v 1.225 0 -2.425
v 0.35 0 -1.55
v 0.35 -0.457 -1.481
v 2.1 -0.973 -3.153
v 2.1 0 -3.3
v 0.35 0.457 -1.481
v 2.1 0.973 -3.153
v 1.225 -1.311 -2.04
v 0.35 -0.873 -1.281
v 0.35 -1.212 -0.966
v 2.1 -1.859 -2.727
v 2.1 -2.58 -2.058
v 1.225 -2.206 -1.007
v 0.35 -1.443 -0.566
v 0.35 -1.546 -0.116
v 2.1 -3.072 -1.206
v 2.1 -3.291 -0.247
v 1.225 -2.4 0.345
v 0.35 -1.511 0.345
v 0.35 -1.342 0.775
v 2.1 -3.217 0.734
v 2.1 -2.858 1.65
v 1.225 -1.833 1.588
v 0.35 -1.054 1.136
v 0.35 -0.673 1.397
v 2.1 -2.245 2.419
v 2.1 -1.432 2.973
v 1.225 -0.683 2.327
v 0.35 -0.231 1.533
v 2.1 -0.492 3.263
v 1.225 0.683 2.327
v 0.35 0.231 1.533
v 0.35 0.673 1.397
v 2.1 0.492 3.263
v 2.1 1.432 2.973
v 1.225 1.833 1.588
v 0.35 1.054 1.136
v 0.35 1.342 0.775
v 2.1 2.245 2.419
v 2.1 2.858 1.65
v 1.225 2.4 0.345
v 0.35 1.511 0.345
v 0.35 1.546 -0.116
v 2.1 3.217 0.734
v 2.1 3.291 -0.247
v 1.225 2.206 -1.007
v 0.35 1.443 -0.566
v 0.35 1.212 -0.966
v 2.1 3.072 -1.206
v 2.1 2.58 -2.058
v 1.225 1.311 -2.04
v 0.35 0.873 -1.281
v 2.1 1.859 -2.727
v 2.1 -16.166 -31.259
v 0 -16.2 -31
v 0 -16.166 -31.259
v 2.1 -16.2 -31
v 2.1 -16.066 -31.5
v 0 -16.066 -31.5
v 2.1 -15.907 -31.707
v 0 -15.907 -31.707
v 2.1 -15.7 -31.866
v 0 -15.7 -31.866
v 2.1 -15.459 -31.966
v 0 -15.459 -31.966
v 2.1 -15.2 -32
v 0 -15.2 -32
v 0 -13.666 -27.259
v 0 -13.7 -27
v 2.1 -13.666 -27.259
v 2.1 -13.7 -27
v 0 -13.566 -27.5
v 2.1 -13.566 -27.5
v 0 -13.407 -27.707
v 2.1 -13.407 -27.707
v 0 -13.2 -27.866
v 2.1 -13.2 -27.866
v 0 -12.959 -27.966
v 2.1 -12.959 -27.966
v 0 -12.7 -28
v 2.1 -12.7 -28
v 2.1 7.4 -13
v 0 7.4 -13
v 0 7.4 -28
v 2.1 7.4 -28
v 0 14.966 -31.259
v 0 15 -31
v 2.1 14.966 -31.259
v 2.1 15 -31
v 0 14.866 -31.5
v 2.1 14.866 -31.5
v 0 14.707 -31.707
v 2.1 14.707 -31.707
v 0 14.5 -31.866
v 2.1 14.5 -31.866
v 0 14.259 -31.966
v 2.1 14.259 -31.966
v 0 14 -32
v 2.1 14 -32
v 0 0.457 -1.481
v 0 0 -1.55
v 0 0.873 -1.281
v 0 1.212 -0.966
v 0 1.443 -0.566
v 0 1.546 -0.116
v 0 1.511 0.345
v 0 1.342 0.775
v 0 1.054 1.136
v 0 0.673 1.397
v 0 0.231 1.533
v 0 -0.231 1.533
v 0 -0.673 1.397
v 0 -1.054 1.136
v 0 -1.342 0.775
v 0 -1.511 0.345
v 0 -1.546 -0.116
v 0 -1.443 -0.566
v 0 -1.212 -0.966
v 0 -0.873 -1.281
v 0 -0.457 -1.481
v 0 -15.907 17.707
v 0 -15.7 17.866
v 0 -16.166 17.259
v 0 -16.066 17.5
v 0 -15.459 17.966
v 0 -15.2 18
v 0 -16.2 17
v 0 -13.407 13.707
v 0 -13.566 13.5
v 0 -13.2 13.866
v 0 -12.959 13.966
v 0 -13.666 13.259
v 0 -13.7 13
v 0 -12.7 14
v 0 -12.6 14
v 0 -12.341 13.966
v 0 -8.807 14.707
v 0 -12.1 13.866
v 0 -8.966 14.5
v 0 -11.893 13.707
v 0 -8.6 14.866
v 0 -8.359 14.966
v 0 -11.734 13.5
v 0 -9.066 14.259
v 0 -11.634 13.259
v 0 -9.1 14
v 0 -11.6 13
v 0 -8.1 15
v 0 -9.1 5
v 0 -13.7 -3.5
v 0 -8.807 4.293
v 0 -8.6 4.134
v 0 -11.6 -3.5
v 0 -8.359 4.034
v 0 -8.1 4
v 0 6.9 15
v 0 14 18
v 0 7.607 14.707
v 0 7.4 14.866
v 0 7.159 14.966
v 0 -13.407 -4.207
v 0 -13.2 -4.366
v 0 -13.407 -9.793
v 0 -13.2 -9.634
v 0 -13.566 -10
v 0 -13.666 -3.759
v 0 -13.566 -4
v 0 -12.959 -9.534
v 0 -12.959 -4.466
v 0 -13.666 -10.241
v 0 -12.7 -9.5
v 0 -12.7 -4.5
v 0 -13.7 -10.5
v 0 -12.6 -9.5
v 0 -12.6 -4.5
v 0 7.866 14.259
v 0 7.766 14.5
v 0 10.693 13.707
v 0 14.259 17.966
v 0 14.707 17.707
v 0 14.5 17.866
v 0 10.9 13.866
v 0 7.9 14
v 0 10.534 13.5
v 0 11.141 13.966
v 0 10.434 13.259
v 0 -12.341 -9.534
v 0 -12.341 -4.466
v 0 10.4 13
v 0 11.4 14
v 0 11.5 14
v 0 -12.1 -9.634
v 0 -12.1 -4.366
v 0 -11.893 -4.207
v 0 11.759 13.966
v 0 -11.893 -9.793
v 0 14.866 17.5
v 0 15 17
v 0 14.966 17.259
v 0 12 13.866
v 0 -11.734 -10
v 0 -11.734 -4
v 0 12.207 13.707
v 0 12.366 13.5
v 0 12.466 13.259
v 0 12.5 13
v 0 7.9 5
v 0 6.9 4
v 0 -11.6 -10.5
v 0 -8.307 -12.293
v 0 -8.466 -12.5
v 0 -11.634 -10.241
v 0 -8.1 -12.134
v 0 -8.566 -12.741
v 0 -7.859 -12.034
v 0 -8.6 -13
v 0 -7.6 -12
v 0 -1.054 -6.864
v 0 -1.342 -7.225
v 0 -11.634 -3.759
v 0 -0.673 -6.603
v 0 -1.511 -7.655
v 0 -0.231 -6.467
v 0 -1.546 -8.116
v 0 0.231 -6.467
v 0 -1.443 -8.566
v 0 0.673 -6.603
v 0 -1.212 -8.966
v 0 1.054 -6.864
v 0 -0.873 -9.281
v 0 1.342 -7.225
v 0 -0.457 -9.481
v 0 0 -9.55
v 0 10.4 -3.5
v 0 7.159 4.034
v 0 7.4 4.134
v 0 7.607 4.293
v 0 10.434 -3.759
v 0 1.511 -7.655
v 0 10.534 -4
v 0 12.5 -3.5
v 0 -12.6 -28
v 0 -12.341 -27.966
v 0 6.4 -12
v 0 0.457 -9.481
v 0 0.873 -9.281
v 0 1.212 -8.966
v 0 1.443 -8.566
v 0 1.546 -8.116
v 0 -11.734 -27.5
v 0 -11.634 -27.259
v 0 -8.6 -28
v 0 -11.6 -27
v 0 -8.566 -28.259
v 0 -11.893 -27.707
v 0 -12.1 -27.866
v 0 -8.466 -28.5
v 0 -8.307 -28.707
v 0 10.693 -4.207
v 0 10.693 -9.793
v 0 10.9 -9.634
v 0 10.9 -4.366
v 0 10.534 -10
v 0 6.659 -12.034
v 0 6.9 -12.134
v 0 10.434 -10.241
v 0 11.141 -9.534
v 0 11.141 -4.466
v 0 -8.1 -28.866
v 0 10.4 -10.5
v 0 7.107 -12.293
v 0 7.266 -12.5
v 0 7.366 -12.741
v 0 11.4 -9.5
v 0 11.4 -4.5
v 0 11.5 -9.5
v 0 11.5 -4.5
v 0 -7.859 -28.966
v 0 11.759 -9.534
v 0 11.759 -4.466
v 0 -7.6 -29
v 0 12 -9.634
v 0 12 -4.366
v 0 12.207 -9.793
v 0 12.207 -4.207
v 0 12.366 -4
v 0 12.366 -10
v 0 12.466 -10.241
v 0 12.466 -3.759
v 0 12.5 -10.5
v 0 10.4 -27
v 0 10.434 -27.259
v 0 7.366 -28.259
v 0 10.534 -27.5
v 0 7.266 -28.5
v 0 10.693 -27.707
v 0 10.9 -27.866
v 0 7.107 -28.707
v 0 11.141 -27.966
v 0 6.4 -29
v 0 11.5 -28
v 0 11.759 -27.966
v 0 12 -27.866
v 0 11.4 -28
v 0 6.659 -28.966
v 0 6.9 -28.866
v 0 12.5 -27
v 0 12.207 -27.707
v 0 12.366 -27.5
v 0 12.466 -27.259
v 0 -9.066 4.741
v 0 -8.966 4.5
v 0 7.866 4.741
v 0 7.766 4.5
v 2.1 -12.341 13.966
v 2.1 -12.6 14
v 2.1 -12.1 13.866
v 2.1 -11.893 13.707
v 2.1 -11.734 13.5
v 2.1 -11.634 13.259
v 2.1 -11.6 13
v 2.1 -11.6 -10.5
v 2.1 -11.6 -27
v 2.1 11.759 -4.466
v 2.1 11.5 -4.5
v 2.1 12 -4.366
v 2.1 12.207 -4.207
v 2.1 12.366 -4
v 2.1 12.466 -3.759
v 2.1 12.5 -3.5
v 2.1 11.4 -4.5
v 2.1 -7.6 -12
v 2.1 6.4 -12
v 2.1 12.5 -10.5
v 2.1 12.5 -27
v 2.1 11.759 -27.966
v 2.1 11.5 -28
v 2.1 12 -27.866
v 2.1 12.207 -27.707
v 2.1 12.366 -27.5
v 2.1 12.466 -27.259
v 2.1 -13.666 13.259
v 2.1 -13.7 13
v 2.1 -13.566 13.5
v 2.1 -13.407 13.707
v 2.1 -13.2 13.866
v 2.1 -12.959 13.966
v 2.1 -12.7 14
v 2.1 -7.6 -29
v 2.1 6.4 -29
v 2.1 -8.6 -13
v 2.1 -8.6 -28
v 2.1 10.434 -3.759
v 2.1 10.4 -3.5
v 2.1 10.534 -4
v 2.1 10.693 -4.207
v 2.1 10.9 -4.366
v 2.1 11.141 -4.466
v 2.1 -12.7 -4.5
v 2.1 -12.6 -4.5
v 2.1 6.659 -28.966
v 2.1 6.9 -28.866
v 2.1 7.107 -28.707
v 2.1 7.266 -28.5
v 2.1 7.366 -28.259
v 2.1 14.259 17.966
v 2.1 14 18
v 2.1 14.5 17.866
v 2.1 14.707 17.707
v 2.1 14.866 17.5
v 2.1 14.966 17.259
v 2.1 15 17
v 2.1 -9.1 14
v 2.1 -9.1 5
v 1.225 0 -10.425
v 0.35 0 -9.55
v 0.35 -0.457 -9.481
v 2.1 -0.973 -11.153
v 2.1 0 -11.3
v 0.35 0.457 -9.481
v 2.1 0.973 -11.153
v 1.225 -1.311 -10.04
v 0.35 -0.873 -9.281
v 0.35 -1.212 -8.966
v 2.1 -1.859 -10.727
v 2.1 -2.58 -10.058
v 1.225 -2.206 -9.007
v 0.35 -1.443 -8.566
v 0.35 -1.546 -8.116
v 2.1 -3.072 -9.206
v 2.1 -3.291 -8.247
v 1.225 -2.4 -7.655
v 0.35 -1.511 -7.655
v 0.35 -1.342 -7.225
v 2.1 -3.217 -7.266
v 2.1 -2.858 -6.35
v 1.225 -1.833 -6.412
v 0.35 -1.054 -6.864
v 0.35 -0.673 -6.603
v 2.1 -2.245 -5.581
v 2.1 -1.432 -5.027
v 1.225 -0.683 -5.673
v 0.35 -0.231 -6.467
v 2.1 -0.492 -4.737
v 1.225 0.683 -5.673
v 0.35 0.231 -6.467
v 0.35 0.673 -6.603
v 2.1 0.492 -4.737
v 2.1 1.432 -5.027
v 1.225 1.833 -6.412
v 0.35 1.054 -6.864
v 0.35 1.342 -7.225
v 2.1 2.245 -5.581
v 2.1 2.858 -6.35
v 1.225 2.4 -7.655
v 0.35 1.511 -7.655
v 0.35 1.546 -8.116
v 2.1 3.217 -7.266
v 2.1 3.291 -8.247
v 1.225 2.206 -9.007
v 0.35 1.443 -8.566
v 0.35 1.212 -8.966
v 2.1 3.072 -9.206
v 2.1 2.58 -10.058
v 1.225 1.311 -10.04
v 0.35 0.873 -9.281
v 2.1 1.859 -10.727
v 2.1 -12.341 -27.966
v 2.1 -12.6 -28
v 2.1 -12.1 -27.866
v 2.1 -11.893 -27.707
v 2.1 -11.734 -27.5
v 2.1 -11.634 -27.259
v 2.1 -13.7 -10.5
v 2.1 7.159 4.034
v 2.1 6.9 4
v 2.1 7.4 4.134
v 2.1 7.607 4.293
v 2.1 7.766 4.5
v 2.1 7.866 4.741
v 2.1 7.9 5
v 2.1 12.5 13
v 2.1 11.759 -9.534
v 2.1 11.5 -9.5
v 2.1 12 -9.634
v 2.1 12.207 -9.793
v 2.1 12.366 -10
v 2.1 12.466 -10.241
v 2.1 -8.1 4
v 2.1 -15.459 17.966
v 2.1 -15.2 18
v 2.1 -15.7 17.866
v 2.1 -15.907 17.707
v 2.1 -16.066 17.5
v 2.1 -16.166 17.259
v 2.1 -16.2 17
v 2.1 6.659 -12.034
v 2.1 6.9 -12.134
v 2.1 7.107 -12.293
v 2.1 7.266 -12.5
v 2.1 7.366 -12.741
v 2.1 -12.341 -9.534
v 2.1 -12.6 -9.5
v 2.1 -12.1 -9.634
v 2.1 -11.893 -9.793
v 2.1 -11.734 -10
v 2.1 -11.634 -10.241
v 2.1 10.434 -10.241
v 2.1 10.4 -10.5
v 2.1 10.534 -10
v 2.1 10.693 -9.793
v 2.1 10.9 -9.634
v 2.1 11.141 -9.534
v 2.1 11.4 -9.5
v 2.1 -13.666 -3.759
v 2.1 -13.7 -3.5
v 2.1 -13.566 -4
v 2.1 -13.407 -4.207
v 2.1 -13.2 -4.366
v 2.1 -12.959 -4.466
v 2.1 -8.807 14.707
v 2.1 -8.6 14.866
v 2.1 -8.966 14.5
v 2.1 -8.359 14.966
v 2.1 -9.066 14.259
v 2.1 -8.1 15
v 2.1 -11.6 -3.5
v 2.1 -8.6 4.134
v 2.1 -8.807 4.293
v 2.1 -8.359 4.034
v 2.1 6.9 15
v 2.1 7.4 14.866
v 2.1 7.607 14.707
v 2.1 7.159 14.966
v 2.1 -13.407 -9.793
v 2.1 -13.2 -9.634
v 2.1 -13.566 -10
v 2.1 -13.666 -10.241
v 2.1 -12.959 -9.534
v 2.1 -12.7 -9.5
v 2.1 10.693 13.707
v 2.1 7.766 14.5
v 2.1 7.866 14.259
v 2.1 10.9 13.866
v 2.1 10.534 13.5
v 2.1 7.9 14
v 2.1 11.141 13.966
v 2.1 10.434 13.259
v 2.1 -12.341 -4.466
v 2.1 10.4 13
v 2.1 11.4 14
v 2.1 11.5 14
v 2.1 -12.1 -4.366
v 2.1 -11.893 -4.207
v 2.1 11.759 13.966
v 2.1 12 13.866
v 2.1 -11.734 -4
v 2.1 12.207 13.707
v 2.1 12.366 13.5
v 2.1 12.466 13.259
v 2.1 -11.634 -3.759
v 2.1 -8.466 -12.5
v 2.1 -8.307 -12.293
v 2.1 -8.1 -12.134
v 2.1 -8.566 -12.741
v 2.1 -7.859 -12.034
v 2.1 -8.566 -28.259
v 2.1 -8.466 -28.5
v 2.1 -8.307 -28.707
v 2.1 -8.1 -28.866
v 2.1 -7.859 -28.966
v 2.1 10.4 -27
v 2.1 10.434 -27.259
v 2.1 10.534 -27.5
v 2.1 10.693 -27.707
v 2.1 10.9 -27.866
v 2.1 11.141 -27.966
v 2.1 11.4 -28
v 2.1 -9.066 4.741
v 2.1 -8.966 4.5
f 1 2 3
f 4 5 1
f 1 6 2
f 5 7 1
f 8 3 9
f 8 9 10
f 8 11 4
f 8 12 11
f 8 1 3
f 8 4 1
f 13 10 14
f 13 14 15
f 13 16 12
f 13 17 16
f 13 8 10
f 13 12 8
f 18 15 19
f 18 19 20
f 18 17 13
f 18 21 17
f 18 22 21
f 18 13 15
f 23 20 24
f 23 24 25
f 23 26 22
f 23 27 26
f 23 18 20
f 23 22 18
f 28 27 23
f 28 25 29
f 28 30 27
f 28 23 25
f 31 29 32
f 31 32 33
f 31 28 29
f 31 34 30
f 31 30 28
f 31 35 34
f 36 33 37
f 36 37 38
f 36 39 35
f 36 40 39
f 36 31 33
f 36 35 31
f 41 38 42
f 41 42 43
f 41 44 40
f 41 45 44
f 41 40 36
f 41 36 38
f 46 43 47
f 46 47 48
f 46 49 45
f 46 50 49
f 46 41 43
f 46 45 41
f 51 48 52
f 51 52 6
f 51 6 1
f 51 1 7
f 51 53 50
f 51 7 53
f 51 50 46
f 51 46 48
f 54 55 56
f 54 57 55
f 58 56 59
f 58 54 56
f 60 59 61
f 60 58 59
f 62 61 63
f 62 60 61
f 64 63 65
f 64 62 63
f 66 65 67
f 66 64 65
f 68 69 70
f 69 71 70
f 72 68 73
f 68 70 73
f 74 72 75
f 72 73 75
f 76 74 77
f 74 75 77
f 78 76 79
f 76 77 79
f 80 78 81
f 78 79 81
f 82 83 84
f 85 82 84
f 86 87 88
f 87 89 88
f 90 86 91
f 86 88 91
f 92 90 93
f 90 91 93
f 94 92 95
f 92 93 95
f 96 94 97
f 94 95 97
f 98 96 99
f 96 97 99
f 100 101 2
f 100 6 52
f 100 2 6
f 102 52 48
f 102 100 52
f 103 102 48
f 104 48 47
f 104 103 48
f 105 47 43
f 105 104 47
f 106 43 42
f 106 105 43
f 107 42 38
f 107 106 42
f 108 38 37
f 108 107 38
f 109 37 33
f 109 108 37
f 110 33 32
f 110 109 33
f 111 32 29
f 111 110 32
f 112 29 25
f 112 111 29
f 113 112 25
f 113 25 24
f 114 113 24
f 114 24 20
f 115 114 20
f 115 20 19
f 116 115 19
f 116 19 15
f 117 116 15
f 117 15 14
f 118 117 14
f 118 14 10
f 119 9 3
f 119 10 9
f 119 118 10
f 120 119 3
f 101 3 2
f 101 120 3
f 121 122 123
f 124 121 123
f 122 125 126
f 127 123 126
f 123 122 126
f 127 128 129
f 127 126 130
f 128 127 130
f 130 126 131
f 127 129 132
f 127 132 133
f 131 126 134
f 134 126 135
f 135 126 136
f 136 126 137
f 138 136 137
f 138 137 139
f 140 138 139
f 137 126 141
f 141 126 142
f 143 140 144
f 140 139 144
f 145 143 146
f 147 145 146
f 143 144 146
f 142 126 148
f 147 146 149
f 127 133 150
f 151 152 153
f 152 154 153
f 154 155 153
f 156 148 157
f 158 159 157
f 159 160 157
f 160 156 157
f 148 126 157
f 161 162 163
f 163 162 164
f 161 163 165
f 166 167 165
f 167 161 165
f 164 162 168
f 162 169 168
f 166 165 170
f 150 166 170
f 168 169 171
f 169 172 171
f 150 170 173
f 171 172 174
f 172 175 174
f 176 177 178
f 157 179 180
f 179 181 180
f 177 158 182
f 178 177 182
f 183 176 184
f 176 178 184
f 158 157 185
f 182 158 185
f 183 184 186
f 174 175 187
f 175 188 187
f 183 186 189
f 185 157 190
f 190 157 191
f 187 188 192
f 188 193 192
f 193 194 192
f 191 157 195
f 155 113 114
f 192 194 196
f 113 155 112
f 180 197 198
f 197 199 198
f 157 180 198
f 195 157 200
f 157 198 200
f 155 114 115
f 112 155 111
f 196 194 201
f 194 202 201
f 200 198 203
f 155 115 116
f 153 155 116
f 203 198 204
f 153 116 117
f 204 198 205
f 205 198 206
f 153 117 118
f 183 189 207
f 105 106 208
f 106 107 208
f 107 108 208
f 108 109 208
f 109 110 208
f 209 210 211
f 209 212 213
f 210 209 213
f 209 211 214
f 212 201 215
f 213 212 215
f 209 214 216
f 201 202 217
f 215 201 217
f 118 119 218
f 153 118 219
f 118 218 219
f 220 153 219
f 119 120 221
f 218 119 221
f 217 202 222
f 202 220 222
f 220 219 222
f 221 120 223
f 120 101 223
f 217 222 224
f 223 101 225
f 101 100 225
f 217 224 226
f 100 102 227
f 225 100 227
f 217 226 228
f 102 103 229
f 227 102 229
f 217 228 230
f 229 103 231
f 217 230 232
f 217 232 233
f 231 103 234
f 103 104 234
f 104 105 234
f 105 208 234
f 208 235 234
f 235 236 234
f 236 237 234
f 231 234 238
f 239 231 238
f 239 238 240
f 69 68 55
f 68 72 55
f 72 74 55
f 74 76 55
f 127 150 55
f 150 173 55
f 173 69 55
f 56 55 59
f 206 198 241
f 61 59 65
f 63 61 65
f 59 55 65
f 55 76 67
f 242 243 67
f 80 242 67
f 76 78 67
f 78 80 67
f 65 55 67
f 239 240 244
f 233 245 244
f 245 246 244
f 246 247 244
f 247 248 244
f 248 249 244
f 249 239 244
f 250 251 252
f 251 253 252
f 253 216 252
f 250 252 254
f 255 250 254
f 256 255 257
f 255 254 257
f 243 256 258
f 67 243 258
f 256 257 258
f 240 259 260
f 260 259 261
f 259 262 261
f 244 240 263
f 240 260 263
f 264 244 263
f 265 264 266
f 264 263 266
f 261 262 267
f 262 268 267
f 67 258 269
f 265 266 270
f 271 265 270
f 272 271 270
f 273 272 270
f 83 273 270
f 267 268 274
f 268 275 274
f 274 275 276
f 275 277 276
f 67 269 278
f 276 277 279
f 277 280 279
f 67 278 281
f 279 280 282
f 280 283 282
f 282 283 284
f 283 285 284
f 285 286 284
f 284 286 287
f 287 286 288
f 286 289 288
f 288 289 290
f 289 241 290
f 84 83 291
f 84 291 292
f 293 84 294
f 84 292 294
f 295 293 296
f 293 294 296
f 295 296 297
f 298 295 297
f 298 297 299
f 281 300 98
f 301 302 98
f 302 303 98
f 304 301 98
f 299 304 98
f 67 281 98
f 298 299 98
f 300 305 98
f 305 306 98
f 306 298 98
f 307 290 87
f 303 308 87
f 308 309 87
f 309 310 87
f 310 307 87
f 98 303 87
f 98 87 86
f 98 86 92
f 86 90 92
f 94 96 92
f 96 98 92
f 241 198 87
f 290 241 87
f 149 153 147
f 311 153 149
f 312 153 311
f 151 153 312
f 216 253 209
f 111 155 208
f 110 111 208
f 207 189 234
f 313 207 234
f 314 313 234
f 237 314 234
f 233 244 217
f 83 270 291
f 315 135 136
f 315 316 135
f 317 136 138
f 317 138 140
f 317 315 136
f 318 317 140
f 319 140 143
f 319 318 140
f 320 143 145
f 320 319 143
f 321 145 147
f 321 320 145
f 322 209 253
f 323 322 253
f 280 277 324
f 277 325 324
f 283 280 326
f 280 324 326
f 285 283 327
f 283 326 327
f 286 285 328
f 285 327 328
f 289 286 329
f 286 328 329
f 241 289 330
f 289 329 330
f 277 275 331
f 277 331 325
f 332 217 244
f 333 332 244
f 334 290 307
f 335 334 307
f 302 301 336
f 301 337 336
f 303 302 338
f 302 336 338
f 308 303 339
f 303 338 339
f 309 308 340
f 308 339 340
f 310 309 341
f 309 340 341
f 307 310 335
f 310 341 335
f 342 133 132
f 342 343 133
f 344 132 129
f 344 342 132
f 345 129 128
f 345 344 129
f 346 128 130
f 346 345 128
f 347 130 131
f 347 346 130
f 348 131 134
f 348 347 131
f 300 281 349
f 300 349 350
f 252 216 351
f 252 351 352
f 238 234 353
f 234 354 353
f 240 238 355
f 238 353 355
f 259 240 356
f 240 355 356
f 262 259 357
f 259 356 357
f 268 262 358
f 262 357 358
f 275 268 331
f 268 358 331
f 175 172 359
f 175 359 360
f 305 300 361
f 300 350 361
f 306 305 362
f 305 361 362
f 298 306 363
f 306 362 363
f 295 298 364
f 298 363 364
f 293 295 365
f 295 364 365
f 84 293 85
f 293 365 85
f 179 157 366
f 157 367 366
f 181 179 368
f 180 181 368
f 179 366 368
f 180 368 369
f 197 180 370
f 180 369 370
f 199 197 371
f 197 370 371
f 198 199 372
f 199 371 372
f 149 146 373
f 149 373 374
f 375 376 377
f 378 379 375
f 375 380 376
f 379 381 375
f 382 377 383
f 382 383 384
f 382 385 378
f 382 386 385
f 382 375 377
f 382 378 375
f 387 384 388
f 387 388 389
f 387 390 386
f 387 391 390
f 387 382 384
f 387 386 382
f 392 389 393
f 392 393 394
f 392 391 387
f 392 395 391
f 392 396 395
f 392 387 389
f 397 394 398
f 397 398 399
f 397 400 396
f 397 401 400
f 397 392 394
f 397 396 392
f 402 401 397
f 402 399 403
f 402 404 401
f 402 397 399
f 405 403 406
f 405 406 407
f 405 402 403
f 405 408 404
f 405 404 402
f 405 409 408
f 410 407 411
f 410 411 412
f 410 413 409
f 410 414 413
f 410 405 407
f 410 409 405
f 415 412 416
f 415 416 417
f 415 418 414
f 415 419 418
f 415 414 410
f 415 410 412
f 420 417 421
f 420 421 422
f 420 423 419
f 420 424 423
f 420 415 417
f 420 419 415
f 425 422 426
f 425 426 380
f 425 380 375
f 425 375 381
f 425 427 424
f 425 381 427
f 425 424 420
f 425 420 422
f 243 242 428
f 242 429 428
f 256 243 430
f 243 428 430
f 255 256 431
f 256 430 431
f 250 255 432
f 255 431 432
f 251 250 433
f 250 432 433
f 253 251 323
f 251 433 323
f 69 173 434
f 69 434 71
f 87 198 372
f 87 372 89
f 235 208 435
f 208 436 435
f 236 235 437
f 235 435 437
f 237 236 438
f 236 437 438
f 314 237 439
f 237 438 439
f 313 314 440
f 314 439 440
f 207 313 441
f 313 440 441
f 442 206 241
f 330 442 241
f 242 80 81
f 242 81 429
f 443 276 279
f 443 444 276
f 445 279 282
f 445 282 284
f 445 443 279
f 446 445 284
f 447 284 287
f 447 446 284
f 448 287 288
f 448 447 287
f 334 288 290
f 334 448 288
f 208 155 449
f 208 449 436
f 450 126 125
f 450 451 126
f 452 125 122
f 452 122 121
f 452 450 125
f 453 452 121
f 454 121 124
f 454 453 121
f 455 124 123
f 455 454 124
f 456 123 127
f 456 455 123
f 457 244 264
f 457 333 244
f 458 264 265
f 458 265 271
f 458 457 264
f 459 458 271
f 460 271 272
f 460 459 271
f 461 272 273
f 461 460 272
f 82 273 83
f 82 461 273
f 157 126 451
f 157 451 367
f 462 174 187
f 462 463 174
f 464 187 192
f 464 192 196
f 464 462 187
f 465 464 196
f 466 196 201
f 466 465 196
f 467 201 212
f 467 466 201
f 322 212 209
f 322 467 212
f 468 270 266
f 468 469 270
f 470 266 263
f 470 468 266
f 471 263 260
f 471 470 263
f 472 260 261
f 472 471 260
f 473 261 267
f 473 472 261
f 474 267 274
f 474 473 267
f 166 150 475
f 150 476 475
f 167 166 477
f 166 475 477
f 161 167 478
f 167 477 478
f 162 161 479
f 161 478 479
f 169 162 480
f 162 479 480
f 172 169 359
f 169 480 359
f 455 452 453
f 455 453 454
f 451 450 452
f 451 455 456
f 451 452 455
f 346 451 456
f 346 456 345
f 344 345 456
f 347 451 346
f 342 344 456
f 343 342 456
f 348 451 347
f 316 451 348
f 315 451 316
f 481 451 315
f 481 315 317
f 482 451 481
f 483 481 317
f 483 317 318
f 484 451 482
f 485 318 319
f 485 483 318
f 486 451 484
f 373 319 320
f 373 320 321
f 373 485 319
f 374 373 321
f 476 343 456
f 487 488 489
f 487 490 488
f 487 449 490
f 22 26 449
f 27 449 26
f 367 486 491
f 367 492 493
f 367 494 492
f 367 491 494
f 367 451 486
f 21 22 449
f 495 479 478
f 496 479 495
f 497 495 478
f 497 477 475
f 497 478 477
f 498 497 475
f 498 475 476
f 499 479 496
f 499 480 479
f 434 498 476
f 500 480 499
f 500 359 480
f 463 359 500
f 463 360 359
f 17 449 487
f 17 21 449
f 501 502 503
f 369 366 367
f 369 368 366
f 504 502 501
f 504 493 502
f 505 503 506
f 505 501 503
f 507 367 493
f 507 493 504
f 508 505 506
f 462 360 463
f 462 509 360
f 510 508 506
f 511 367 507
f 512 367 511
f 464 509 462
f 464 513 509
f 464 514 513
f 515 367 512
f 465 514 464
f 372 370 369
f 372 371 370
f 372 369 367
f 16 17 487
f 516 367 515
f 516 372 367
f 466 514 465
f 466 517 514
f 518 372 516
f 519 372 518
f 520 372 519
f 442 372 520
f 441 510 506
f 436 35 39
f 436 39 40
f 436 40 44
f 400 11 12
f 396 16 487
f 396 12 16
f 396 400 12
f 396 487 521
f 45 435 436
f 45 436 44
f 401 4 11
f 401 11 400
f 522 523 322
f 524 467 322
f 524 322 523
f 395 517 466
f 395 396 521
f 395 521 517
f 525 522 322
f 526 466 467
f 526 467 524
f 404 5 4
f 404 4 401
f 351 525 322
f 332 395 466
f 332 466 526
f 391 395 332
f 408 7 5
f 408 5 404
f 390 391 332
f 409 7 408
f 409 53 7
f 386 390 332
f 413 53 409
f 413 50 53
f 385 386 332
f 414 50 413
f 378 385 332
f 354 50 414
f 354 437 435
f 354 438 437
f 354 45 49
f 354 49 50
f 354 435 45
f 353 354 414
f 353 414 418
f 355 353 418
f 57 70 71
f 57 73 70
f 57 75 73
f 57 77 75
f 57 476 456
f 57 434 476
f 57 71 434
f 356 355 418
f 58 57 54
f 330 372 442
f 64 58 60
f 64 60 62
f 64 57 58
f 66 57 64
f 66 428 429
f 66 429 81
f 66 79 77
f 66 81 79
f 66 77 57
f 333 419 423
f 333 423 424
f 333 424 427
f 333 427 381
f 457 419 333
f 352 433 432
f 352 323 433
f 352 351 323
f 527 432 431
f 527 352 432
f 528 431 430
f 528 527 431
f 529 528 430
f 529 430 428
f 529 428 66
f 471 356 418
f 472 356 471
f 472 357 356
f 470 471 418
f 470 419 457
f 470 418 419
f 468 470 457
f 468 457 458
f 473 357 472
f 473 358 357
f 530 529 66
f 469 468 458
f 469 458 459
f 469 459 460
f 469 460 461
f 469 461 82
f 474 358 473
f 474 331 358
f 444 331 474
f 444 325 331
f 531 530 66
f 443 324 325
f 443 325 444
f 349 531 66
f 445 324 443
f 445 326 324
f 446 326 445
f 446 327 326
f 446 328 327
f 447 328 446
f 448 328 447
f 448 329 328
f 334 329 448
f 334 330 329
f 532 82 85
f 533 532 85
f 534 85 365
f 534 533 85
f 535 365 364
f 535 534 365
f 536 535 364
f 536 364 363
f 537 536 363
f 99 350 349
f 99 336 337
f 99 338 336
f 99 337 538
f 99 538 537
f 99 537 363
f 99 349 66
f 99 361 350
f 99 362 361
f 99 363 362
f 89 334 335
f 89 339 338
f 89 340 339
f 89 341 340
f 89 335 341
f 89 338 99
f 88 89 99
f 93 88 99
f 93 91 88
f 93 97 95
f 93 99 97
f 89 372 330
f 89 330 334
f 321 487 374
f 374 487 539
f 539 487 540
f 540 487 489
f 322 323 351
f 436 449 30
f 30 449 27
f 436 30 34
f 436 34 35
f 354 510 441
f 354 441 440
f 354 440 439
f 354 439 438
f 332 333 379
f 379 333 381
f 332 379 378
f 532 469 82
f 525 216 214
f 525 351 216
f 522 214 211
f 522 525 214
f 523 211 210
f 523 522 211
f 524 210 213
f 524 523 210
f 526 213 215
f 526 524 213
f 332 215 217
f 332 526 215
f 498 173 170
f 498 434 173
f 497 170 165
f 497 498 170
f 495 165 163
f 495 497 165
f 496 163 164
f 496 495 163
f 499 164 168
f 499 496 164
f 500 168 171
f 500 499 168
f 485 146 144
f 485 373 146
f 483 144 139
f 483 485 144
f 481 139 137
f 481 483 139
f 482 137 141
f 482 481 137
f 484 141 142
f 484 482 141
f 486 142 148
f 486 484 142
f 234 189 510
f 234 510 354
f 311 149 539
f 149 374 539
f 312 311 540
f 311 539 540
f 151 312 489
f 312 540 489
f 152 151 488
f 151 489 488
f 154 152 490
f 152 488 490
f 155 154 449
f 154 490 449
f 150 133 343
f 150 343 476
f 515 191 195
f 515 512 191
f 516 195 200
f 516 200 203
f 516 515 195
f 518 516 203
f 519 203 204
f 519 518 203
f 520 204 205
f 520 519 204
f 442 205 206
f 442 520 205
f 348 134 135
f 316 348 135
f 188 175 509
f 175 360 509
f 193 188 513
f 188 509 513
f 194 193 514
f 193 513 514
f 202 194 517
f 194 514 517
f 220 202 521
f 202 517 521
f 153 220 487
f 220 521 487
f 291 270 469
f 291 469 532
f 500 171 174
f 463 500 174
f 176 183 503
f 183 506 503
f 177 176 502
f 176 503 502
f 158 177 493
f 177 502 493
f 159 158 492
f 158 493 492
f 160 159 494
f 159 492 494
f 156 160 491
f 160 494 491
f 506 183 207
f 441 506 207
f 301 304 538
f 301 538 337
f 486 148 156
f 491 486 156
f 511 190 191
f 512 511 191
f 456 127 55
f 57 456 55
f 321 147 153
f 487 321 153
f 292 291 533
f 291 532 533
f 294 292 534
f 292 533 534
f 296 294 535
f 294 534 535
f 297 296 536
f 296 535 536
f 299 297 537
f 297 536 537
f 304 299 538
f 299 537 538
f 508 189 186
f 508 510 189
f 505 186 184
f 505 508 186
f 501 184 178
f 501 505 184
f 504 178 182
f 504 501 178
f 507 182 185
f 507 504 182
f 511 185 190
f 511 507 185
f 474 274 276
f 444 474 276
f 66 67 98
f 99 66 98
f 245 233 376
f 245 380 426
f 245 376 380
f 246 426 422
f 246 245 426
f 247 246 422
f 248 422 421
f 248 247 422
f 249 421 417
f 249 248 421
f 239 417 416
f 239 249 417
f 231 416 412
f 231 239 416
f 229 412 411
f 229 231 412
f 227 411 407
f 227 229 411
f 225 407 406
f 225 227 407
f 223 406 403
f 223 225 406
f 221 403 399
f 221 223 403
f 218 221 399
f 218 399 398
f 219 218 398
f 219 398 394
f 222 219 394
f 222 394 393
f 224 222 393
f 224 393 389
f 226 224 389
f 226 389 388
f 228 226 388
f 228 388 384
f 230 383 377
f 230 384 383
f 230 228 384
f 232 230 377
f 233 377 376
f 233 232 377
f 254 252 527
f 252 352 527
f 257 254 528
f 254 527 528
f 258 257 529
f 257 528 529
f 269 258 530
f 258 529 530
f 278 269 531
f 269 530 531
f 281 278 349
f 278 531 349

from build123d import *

# Parameters (mm, degrees)
SKETCH_1_W               = 50
SKETCH_1_H               = 31.2
SKETCH_1_R               = 1.55
SKETCH_1_W_2             = 18.5
SKETCH_1_H_2             = 2.1
SKETCH_1_W_3             = 17
SKETCH_1_H_3             = 16
SKETCH_1_W_4             = 11
SKETCH_1_H_4             = 17
EXTRUDE_1_DEPTH          = 2.1
HOLE_WIZARD_1_AT_2_COUNT = 2
HOLE_WIZARD_1_AT_2_PITCH = 8
FILLET_1_R               = 1


with BuildPart() as part:
    # 草图1 → 凸台-拉伸1 (new body)
    with BuildSketch(Plane(origin=(0, 0, 0), x_dir=(0, 0, -1), z_dir=(1, 0, 0))):
        with Locations((7, -0.6)):
            Rectangle(SKETCH_1_W, SKETCH_1_H)
        Circle(SKETCH_1_R, mode=Mode.SUBTRACT)
        with Locations((8, 0)):
            Circle(SKETCH_1_R, mode=Mode.SUBTRACT)
        with Locations((-4.75, 11.45)):
            Rectangle(SKETCH_1_W_2, SKETCH_1_H_2, mode=Mode.SUBTRACT)
        with Locations((18.75, 11.45)):
            Rectangle(SKETCH_1_W_2, SKETCH_1_H_2, mode=Mode.SUBTRACT)
        with Locations((18.75, -12.65)):
            Rectangle(SKETCH_1_W_2, SKETCH_1_H_2, mode=Mode.SUBTRACT)
        with Locations((-4.75, -12.65)):
            Rectangle(SKETCH_1_W_2, SKETCH_1_H_2, mode=Mode.SUBTRACT)
        with Locations((20.5, -0.6)):
            Rectangle(SKETCH_1_W_3, SKETCH_1_H_3, mode=Mode.SUBTRACT)
        with Locations((-9.5, -0.6)):
            Rectangle(SKETCH_1_W_4, SKETCH_1_H_4, mode=Mode.SUBTRACT)
    extrude(amount=EXTRUDE_1_DEPTH)

    # 草图2 → 打孔尺寸(%根据十字)槽沉头木螺钉的类型1 (revolve, cut)
    with BuildSketch(Plane(origin=(2.1, 0, 0), x_dir=(0, 0, -1), z_dir=(0, 1, 0))):
        Polygon((0, 0), (0, 2.1), (1.55, 2.1), (1.55, 1.75), (3.3, 0), align=None)
    hole_wizard_1 = revolve(axis=Axis((8.45, 0, 0), (-1, 0, 0)), mode=Mode.SUBTRACT)

    # 打孔尺寸(%根据十字)槽沉头木螺钉的类型1 at 2: 打孔尺寸(%根据十字)槽沉头木螺钉的类型1 ×2
    with Locations(*[(0, 0, -i * HOLE_WIZARD_1_AT_2_PITCH) for i in range(1, HOLE_WIZARD_1_AT_2_COUNT)]):
        add(hole_wizard_1, mode=Mode.SUBTRACT)

    # 圆角1
    fillet_1_edges = [part.edges().sort_by_distance(p)[0] for p in [
        (1.05, 12.5, 14),
        (1.05, 10.4, 14),
        (1.05, 10.4, -4.5),
        (1.05, 12.5, -4.5),
        (1.05, 12.5, -9.5),
        (1.05, 10.4, -9.5),
        (1.05, 10.4, -28),
        (1.05, 12.5, -28),
        (1.05, -11.6, -28),
        (1.05, -11.6, -9.5),
        (1.05, -13.7, -9.5),
        (1.05, -13.7, -28),
        (1.05, -13.7, -4.5),
        (1.05, -11.6, -4.5),
        (1.05, -11.6, 14),
        (1.05, -13.7, 14),
        (1.05, 15, 18),
        (1.05, 7.4, -12),
        (1.05, 15, -32),
        (1.05, -8.6, -12),
        (1.05, -8.6, -29),
        (1.05, 7.4, -29),
        (1.05, -16.2, -32),
        (1.05, -16.2, 18),
        (1.05, 7.9, 15),
        (1.05, -9.1, 15),
        (1.05, -9.1, 4),
        (1.05, 7.9, 4),
    ]]
    fillet(fillet_1_edges, radius=FILLET_1_R)


solid = part.part
